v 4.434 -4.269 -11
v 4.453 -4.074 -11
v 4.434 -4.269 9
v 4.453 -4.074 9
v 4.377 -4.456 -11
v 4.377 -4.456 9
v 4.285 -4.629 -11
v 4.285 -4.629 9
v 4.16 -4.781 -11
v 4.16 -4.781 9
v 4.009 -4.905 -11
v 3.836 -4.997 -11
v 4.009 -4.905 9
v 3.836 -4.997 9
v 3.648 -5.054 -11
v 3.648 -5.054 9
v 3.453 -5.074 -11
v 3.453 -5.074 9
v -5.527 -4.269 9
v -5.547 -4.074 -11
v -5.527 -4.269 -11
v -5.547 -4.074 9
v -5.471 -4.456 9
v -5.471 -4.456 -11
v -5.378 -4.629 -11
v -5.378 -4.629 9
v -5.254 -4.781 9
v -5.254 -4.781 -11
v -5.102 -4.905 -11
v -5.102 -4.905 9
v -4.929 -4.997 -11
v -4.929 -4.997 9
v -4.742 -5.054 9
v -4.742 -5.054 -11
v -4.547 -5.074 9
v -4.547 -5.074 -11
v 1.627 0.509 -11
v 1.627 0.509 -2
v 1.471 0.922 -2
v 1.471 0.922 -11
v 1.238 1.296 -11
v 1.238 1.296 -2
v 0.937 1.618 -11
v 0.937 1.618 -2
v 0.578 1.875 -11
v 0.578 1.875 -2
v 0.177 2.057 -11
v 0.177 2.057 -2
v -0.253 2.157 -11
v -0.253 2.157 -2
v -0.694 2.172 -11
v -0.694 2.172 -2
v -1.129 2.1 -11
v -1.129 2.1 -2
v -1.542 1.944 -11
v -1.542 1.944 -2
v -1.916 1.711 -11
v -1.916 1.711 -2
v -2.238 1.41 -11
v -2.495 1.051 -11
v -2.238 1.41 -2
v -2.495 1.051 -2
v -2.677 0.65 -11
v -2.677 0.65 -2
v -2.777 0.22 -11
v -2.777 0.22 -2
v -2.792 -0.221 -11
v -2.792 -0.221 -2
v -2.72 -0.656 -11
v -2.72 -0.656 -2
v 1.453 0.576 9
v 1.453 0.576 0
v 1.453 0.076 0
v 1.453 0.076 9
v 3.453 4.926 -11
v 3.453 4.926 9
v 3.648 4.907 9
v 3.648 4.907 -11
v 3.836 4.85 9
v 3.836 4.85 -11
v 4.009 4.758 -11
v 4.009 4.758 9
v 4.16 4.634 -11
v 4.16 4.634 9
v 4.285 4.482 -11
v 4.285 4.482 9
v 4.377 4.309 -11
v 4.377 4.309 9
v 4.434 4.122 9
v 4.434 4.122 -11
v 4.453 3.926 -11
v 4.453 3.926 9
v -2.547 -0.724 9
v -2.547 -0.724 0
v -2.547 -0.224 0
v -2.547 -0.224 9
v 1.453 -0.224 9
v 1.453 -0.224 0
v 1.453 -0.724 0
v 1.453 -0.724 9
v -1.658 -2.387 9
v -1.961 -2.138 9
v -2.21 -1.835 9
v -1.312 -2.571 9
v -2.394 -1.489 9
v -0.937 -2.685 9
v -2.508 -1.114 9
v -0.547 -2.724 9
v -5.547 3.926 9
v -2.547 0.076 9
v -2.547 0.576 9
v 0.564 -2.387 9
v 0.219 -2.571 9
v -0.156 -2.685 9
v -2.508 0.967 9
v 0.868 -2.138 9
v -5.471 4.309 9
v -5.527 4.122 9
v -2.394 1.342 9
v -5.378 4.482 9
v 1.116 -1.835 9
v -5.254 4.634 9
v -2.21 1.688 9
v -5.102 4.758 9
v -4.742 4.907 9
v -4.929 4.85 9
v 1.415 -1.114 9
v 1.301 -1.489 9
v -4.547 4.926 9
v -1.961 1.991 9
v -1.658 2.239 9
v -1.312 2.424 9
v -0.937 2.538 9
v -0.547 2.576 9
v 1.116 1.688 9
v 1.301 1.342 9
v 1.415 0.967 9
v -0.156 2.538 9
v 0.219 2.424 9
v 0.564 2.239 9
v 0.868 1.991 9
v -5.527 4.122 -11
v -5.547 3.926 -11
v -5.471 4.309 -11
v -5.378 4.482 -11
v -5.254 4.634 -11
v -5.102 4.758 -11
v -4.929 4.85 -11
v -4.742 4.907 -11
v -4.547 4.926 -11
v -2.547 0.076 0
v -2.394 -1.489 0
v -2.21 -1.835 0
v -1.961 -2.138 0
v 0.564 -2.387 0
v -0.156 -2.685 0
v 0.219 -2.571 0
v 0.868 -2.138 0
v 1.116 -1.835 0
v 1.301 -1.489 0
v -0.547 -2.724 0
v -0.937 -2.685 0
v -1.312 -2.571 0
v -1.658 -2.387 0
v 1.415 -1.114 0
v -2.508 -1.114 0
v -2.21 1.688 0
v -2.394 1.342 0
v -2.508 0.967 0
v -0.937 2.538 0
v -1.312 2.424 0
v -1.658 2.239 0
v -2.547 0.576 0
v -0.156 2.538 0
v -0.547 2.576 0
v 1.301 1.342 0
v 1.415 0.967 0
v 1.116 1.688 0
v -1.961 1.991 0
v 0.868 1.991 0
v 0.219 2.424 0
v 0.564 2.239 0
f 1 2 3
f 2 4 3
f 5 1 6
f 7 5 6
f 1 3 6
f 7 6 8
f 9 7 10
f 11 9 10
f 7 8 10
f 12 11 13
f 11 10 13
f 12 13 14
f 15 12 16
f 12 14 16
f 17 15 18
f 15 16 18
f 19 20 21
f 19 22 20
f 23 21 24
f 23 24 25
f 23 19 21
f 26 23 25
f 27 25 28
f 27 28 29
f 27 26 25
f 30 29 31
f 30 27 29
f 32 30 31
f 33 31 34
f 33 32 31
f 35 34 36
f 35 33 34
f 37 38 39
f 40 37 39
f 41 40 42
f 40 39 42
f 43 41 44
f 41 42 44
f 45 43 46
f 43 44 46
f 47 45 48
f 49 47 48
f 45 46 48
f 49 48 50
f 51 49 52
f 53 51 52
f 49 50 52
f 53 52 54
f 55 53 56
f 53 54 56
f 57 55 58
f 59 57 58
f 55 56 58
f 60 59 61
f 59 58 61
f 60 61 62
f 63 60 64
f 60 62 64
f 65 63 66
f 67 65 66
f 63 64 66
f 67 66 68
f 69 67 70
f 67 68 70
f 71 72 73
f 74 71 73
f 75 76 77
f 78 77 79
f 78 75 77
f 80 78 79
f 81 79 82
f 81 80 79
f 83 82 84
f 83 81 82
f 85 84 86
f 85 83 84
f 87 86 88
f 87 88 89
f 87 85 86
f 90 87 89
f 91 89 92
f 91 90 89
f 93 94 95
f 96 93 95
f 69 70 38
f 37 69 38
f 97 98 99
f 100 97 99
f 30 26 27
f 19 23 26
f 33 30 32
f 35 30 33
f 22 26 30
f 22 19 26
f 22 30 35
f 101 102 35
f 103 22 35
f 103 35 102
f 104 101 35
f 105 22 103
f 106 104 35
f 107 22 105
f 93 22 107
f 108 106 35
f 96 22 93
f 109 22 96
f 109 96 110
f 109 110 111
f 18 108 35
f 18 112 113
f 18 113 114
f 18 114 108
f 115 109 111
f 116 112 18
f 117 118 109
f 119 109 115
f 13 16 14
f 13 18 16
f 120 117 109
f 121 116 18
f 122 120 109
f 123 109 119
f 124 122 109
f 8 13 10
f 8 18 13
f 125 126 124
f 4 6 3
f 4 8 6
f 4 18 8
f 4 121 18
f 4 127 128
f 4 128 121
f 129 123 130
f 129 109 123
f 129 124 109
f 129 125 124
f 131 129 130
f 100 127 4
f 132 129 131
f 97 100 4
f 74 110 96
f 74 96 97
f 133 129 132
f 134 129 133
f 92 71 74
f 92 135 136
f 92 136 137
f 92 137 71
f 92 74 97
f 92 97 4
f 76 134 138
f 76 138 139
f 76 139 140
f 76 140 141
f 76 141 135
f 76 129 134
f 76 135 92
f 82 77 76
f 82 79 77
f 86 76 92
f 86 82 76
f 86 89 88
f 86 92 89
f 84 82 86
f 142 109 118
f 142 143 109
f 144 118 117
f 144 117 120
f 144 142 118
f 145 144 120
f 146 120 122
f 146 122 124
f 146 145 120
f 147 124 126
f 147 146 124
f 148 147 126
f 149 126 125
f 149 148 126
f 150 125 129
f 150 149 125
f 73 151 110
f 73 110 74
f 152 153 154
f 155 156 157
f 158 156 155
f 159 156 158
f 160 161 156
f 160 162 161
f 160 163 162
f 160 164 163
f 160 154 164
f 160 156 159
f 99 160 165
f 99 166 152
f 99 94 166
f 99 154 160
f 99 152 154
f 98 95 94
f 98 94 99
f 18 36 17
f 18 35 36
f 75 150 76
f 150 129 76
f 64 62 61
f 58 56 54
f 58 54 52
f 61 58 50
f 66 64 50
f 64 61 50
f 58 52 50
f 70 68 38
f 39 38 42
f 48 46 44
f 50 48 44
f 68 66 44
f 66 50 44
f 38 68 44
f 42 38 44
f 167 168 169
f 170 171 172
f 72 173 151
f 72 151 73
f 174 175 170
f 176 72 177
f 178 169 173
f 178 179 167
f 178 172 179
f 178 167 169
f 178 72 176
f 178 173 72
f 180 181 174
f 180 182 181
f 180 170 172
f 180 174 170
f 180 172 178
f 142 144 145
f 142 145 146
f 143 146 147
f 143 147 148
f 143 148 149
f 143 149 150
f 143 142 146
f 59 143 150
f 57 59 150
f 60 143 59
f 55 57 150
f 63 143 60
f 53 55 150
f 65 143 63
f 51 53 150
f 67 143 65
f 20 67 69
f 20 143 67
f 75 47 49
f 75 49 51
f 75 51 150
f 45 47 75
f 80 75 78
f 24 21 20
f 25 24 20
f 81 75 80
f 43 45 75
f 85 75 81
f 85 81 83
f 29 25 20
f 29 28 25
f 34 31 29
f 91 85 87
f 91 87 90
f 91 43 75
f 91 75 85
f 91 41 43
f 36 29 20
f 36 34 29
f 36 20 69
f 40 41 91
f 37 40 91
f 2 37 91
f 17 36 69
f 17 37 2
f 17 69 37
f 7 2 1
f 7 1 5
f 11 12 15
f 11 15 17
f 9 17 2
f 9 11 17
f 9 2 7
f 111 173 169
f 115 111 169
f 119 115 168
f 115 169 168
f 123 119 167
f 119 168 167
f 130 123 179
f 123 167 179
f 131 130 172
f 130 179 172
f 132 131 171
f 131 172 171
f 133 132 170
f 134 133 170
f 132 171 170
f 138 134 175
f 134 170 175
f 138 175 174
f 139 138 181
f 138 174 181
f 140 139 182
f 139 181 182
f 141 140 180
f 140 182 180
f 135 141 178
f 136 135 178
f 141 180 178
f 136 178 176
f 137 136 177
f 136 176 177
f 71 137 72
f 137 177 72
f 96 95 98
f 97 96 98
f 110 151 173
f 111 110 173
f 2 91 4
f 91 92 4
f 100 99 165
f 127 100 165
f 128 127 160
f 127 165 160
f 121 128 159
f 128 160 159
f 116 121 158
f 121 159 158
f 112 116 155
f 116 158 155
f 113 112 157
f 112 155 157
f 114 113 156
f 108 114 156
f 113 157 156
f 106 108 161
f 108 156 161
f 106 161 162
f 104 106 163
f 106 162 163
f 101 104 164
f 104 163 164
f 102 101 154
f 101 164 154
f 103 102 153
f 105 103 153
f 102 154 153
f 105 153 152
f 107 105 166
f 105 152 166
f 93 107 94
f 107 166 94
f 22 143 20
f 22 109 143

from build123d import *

# Parameters (mm, degrees)
F0_W     = 10
F0_H     = 10
F0_W_2   = 4
F0_H_2   = 0.3
F1_DEPTH = 9
F2_DEPTH = 2
F3_W     = 10
F3_H     = 10
F4_DEPTH = 9
F6_R     = 1


with BuildPart() as f1:
    # F0 (on Top) → F1 (new body)
    with BuildSketch(Plane.XY):
        with Locations((-0.546654, -0.073579)):
            Rectangle(F0_W, F0_H)
        with BuildLine():
            Line((1.453346, 0.076421), (1.453346, -0.223579))
            Line((1.453346, -0.223579), (1.453346, -0.723579))
            ThreePointArc((1.453346, -0.723579), (-0.546654, -2.723579), (-2.546654, -0.723579))
            Line((-2.546654, -0.723579), (-2.546654, -0.223579))
            Line((-2.546654, -0.223579), (-2.546654, 0.076421))
            Line((-2.546654, 0.076421), (-2.546654, 0.576421))
            ThreePointArc((-2.546654, 0.576421), (-0.546654, 2.576421), (1.453346, 0.576421))
            Line((1.453346, 0.576421), (1.453346, 0.076421))
        make_face(mode=Mode.SUBTRACT)
        with Locations((-0.546654, -0.073579)):
            Rectangle(F0_W_2, F0_H_2)
    extrude(amount=F1_DEPTH)

    # F0 (on Top) → F2 (join)
    with BuildSketch(Plane.XY):
        with Locations((-0.546654, -0.073579)):
            Rectangle(F0_W, F0_H)
        with BuildLine():
            Line((1.453346, 0.076421), (1.453346, -0.223579))
            Line((1.453346, -0.223579), (1.453346, -0.723579))
            ThreePointArc((1.453346, -0.723579), (-0.546654, -2.723579), (-2.546654, -0.723579))
            Line((-2.546654, -0.723579), (-2.546654, -0.223579))
            Line((-2.546654, -0.223579), (-2.546654, 0.076421))
            Line((-2.546654, 0.076421), (-2.546654, 0.576421))
            ThreePointArc((-2.546654, 0.576421), (-0.546654, 2.576421), (1.453346, 0.576421))
            Line((1.453346, 0.576421), (1.453346, 0.076421))
        make_face(mode=Mode.SUBTRACT)
        with BuildLine():
            Line((1.453346, -0.723579), (1.453346, -0.223579))
            Line((1.453346, -0.223579), (-2.546654, -0.223579))
            Line((-2.546654, -0.223579), (-2.546654, -0.723579))
            ThreePointArc((-2.546654, -0.723579), (-0.546654, -2.723579), (1.453346, -0.723579))
        make_face()
        with Locations((-0.546654, -0.073579)):
            Rectangle(F0_W_2, F0_H_2)
        with BuildLine():
            Line((-2.546654, 0.076421), (1.453346, 0.076421))
            Line((1.453346, 0.076421), (1.453346, 0.576421))
            ThreePointArc((1.453346, 0.576421), (-0.546654, 2.576421), (-2.546654, 0.576421))
            Line((-2.546654, 0.576421), (-2.546654, 0.076421))
        make_face()
    extrude(amount=-F2_DEPTH)


with BuildPart() as f4:
    # F3 (on face) → F4 (new body)
    with BuildSketch(Plane(origin=(0, 0, -2), x_dir=(1, 0, 0), z_dir=(0, 0, -1))):
        with Locations((-0.546654, 0.073579)):
            Rectangle(F3_W, F3_H)
        with BuildLine():
            ThreePointArc((-2.719987, 0.655922), (-0.25297, 2.30433), (1.703346, 0.073579))
            ThreePointArc((1.703346, 0.073579), (1.684097, -0.220104), (1.626679, -0.508763))
            ThreePointArc((1.626679, -0.508763), (-1.128997, -2.099754), (-2.719987, 0.655922))
        make_face(mode=Mode.SUBTRACT)
        with BuildLine():
            ThreePointArc((1.626679, -0.508763), (1.684097, -0.220104), (1.703346, 0.073579))
            ThreePointArc((1.703346, 0.073579), (-0.25297, 2.30433), (-2.719987, 0.655922))
            Line((-2.719987, 0.655922), (1.626679, -0.508763))
        make_face()
    extrude(amount=F4_DEPTH)


with BuildPart() as f1_1:
    add(f1.part)

    # F5: union F4
    add(f4.part)

    # F6
    f6_edges = [f1_1.edges().sort_by_distance(p)[0] for p in [
        (-5.546654, 4.926421, -1),
        (4.453346, 4.926421, -1),
        (4.453346, -5.073579, -1),
        (-5.546654, -5.073579, -1),
    ]]
    fillet(f6_edges, radius=F6_R)


solid = f1_1.part
